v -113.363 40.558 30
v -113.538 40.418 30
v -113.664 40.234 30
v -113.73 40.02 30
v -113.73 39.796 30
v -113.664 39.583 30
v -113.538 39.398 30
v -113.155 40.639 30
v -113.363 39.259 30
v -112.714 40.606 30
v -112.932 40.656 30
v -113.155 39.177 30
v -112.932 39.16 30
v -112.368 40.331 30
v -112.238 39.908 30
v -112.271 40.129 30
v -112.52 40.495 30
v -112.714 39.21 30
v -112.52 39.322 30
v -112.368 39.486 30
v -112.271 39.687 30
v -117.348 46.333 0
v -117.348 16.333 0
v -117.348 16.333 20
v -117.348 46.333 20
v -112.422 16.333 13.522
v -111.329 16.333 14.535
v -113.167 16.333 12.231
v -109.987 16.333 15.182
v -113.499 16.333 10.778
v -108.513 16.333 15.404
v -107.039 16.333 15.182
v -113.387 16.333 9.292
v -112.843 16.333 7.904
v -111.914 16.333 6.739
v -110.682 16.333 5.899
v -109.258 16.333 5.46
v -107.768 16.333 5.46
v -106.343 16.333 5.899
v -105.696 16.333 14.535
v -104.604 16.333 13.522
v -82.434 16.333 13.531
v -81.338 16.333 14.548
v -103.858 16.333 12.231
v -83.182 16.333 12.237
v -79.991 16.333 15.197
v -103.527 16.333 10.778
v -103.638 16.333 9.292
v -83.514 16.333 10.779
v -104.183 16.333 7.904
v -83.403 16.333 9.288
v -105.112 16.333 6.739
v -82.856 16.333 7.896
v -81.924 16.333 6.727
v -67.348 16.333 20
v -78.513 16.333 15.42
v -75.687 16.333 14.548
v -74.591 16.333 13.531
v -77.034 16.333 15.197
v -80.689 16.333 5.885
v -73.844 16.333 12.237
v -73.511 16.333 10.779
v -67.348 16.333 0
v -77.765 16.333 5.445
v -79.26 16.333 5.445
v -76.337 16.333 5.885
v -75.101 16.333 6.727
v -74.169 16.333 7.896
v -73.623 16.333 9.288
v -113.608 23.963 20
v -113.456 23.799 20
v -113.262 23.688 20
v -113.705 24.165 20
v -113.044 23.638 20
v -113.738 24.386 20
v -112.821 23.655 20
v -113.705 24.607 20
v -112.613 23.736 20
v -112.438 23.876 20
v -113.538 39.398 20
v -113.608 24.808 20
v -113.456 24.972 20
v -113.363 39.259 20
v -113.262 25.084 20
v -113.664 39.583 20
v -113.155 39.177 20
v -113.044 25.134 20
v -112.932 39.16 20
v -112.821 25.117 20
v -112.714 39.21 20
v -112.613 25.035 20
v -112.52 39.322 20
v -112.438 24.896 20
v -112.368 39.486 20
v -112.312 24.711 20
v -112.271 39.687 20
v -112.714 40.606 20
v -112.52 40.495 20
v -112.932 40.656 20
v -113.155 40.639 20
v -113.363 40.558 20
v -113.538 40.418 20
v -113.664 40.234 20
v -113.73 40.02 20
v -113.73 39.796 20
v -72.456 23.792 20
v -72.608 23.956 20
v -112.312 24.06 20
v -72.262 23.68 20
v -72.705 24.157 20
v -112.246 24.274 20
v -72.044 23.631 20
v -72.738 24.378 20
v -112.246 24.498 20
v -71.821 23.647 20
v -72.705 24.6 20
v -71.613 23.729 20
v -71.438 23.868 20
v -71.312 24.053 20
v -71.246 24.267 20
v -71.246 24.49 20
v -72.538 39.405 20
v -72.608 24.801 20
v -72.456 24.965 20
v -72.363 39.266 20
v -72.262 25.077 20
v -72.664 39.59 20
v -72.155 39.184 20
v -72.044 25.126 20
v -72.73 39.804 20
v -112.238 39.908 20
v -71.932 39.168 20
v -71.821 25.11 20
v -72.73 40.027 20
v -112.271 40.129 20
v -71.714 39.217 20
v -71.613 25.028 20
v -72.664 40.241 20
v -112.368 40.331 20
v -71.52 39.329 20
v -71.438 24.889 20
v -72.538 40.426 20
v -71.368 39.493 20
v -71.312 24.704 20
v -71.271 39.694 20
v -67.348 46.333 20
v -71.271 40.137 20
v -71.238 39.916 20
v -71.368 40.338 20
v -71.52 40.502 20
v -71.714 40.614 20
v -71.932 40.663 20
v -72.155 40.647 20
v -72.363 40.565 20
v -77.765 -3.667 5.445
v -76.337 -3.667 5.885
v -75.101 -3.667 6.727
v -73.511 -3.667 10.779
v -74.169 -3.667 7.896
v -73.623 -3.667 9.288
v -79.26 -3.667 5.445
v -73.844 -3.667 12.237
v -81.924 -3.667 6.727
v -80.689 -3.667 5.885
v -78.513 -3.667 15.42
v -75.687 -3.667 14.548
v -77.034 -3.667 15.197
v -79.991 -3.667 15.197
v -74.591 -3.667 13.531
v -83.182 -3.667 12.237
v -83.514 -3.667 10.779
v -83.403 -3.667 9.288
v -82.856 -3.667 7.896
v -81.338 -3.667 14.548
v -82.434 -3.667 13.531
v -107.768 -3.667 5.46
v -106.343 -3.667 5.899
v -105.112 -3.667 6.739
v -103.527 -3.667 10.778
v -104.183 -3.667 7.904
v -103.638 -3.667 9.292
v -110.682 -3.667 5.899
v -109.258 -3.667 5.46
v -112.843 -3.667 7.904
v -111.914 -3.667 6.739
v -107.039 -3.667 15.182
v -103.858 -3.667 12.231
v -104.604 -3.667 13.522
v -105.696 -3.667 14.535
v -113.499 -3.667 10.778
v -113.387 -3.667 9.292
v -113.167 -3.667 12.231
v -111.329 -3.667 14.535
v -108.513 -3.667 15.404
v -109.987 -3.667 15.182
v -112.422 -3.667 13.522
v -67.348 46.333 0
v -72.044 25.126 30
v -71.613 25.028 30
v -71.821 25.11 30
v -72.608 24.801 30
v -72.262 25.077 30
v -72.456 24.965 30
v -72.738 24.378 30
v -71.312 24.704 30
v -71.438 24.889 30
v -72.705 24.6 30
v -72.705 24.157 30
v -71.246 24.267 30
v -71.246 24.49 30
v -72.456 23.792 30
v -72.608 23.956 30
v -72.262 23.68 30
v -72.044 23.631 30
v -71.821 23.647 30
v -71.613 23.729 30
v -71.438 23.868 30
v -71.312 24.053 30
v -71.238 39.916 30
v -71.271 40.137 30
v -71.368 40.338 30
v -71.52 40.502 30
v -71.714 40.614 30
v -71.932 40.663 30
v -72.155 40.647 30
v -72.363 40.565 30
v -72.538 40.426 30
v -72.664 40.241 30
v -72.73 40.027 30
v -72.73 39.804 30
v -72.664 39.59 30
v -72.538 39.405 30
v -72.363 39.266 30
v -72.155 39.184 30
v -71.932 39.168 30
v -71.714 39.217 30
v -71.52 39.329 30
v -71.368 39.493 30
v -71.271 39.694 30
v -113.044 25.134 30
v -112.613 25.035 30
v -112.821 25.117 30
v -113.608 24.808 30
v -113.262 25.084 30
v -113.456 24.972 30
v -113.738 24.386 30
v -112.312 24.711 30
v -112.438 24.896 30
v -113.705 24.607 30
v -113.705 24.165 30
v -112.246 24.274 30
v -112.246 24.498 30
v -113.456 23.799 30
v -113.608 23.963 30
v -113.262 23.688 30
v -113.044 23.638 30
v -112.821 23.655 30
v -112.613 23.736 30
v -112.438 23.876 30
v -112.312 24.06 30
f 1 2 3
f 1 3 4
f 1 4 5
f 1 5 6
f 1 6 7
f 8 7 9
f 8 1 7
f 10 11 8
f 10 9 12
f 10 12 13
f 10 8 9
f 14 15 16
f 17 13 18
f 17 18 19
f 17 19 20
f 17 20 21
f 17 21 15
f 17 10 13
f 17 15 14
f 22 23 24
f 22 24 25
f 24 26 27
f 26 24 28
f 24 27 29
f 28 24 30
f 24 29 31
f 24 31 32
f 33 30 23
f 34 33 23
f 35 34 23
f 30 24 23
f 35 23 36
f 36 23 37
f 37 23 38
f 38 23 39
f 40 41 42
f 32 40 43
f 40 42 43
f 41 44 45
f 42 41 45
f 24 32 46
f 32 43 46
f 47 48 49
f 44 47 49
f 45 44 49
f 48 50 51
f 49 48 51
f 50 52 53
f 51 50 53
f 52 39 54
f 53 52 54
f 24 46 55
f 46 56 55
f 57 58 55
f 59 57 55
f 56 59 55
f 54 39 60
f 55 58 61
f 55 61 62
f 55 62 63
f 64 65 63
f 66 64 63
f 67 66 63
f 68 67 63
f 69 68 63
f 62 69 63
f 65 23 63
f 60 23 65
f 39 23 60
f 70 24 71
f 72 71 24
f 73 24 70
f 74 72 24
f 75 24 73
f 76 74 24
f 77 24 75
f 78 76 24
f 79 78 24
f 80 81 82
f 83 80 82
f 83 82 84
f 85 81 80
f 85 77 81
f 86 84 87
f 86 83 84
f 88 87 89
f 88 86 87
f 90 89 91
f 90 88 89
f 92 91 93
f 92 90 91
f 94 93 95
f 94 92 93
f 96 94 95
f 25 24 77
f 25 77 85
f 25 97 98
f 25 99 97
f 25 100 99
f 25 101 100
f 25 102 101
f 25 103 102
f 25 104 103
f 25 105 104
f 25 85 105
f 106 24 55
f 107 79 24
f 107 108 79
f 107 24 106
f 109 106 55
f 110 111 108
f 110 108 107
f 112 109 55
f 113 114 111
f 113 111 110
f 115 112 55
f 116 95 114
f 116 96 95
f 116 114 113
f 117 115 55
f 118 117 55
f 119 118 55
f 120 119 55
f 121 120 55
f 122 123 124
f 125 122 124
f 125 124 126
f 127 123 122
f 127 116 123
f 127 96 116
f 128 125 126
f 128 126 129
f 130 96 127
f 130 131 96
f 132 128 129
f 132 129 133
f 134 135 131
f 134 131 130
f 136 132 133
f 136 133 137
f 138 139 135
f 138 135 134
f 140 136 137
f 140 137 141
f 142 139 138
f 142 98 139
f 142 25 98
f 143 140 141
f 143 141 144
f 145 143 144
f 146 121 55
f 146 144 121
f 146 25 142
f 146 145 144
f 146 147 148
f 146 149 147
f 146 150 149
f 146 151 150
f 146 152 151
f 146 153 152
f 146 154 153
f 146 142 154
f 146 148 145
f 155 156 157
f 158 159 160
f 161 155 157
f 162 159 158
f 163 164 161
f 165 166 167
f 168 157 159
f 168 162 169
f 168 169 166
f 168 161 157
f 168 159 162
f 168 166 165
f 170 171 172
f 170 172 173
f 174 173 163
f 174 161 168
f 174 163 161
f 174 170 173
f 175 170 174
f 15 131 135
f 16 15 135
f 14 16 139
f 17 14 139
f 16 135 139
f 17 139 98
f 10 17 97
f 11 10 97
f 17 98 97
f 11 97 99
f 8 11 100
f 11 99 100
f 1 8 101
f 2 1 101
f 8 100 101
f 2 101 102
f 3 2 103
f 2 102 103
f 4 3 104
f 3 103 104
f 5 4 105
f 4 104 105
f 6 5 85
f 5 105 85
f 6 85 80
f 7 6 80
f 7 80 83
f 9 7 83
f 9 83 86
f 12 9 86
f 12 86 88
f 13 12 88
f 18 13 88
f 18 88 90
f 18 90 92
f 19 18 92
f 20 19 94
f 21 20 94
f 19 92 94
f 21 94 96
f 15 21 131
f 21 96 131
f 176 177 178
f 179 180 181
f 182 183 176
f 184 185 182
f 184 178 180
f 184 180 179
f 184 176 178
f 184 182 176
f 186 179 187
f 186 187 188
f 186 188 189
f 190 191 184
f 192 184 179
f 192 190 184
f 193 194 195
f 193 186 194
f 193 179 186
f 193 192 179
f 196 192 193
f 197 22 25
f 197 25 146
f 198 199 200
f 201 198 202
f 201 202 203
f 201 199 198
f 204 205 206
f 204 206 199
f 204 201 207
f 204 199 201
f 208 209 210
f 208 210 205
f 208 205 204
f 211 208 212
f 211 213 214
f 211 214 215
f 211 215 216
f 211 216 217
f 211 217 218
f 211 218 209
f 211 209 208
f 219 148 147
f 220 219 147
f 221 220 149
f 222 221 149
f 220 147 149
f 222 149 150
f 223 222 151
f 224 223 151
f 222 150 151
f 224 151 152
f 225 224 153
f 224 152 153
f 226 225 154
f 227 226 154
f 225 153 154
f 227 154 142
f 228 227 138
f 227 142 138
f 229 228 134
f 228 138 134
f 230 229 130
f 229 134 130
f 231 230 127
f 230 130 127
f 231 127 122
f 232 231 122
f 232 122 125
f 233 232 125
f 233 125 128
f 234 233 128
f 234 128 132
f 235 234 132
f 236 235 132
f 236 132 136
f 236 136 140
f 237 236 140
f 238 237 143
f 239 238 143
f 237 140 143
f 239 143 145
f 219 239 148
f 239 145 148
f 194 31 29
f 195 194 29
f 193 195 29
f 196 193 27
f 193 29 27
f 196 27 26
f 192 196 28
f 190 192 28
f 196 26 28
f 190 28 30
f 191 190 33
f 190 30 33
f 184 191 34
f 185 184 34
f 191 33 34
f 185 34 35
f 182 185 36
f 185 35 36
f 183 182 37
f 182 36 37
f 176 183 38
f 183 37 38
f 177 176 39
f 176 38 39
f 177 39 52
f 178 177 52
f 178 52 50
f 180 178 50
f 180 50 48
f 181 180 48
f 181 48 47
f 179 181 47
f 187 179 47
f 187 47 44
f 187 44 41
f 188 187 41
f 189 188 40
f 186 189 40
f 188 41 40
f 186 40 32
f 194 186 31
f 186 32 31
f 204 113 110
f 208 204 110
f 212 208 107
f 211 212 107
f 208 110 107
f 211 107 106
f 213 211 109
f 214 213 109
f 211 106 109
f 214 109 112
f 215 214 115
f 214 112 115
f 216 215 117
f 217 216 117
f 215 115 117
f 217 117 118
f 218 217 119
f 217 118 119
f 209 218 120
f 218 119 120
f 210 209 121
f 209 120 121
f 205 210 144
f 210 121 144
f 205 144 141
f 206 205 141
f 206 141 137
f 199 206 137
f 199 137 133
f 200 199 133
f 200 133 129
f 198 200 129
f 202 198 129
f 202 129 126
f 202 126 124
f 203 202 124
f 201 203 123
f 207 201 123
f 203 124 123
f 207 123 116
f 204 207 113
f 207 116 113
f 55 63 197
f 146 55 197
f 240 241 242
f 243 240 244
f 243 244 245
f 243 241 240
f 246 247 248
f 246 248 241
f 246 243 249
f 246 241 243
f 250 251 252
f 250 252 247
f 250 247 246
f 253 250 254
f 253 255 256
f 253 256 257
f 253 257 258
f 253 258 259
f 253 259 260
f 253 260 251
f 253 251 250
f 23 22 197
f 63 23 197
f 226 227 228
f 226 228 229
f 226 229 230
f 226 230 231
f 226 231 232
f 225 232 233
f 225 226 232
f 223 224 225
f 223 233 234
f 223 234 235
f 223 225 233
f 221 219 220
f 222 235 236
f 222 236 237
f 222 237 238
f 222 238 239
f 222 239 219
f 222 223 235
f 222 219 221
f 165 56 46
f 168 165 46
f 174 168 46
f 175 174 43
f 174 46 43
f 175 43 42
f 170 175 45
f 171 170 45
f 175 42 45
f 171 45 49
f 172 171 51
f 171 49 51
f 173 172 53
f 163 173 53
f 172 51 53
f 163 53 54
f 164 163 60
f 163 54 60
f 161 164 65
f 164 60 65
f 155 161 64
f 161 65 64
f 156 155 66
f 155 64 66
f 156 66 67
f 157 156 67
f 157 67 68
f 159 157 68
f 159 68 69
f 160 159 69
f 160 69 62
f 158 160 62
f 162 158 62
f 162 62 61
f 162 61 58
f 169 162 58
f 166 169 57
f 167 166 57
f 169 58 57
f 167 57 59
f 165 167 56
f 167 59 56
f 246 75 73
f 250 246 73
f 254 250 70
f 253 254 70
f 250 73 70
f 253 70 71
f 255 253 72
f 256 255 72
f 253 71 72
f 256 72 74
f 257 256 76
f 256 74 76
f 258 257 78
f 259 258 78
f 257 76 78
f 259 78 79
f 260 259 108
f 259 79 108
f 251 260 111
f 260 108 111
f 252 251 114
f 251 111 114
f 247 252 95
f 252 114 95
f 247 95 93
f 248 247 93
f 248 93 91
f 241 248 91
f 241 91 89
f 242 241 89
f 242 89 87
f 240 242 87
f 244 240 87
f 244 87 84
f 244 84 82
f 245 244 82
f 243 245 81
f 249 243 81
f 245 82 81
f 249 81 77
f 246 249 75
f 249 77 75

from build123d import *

# Parameters (mm, degrees)
SKETCH1_W           = 50
SKETCH1_H           = 30
BOSS_EXTRUDE1_DEPTH = 20
SKETCH2_R           = 5
SKETCH2_R_2         = 5.015568952
BOSS_EXTRUDE3_DEPTH = 20
SKETCH3_R           = 0.75
BOSS_EXTRUDE4_DEPTH = 10


with BuildPart() as part:
    # Sketch1 → Boss-Extrude1 (new body)
    with BuildSketch(Plane.XY):
        with Locations((-92.348484848, 31.333080808)):
            Rectangle(SKETCH1_W, SKETCH1_H)
    extrude(amount=BOSS_EXTRUDE1_DEPTH)

    # Sketch2 → Boss-Extrude3 (add)
    with BuildSketch(Plane.XZ.offset(-16.333080808)):
        with Locations(Location((-108.512795062, 10.404107755, 0), (0, 0, 90))):
            Circle(SKETCH2_R)
        with Locations(Location((-78.512795062, 10.404107755, 0), (0, 0, 90))):
            Circle(SKETCH2_R_2)
    extrude(amount=BOSS_EXTRUDE3_DEPTH)

    # Sketch3 → Boss-Extrude4 (add)
    with BuildSketch(Plane.XY.offset(20)):
        with Locations((-112.98809036, 39.90814541)):
            Circle(SKETCH3_R)
        with Locations((-71.988091026, 39.915535227)):
            Circle(SKETCH3_R)
        with Locations(Location((-71.988091026, 24.378479398, 0), (0, 0, 180))):
            Circle(SKETCH3_R)
        with Locations(Location((-112.98809036, 24.385869214, 0), (0, 0, 180))):
            Circle(SKETCH3_R)
    extrude(amount=BOSS_EXTRUDE4_DEPTH)


solid = part.part
